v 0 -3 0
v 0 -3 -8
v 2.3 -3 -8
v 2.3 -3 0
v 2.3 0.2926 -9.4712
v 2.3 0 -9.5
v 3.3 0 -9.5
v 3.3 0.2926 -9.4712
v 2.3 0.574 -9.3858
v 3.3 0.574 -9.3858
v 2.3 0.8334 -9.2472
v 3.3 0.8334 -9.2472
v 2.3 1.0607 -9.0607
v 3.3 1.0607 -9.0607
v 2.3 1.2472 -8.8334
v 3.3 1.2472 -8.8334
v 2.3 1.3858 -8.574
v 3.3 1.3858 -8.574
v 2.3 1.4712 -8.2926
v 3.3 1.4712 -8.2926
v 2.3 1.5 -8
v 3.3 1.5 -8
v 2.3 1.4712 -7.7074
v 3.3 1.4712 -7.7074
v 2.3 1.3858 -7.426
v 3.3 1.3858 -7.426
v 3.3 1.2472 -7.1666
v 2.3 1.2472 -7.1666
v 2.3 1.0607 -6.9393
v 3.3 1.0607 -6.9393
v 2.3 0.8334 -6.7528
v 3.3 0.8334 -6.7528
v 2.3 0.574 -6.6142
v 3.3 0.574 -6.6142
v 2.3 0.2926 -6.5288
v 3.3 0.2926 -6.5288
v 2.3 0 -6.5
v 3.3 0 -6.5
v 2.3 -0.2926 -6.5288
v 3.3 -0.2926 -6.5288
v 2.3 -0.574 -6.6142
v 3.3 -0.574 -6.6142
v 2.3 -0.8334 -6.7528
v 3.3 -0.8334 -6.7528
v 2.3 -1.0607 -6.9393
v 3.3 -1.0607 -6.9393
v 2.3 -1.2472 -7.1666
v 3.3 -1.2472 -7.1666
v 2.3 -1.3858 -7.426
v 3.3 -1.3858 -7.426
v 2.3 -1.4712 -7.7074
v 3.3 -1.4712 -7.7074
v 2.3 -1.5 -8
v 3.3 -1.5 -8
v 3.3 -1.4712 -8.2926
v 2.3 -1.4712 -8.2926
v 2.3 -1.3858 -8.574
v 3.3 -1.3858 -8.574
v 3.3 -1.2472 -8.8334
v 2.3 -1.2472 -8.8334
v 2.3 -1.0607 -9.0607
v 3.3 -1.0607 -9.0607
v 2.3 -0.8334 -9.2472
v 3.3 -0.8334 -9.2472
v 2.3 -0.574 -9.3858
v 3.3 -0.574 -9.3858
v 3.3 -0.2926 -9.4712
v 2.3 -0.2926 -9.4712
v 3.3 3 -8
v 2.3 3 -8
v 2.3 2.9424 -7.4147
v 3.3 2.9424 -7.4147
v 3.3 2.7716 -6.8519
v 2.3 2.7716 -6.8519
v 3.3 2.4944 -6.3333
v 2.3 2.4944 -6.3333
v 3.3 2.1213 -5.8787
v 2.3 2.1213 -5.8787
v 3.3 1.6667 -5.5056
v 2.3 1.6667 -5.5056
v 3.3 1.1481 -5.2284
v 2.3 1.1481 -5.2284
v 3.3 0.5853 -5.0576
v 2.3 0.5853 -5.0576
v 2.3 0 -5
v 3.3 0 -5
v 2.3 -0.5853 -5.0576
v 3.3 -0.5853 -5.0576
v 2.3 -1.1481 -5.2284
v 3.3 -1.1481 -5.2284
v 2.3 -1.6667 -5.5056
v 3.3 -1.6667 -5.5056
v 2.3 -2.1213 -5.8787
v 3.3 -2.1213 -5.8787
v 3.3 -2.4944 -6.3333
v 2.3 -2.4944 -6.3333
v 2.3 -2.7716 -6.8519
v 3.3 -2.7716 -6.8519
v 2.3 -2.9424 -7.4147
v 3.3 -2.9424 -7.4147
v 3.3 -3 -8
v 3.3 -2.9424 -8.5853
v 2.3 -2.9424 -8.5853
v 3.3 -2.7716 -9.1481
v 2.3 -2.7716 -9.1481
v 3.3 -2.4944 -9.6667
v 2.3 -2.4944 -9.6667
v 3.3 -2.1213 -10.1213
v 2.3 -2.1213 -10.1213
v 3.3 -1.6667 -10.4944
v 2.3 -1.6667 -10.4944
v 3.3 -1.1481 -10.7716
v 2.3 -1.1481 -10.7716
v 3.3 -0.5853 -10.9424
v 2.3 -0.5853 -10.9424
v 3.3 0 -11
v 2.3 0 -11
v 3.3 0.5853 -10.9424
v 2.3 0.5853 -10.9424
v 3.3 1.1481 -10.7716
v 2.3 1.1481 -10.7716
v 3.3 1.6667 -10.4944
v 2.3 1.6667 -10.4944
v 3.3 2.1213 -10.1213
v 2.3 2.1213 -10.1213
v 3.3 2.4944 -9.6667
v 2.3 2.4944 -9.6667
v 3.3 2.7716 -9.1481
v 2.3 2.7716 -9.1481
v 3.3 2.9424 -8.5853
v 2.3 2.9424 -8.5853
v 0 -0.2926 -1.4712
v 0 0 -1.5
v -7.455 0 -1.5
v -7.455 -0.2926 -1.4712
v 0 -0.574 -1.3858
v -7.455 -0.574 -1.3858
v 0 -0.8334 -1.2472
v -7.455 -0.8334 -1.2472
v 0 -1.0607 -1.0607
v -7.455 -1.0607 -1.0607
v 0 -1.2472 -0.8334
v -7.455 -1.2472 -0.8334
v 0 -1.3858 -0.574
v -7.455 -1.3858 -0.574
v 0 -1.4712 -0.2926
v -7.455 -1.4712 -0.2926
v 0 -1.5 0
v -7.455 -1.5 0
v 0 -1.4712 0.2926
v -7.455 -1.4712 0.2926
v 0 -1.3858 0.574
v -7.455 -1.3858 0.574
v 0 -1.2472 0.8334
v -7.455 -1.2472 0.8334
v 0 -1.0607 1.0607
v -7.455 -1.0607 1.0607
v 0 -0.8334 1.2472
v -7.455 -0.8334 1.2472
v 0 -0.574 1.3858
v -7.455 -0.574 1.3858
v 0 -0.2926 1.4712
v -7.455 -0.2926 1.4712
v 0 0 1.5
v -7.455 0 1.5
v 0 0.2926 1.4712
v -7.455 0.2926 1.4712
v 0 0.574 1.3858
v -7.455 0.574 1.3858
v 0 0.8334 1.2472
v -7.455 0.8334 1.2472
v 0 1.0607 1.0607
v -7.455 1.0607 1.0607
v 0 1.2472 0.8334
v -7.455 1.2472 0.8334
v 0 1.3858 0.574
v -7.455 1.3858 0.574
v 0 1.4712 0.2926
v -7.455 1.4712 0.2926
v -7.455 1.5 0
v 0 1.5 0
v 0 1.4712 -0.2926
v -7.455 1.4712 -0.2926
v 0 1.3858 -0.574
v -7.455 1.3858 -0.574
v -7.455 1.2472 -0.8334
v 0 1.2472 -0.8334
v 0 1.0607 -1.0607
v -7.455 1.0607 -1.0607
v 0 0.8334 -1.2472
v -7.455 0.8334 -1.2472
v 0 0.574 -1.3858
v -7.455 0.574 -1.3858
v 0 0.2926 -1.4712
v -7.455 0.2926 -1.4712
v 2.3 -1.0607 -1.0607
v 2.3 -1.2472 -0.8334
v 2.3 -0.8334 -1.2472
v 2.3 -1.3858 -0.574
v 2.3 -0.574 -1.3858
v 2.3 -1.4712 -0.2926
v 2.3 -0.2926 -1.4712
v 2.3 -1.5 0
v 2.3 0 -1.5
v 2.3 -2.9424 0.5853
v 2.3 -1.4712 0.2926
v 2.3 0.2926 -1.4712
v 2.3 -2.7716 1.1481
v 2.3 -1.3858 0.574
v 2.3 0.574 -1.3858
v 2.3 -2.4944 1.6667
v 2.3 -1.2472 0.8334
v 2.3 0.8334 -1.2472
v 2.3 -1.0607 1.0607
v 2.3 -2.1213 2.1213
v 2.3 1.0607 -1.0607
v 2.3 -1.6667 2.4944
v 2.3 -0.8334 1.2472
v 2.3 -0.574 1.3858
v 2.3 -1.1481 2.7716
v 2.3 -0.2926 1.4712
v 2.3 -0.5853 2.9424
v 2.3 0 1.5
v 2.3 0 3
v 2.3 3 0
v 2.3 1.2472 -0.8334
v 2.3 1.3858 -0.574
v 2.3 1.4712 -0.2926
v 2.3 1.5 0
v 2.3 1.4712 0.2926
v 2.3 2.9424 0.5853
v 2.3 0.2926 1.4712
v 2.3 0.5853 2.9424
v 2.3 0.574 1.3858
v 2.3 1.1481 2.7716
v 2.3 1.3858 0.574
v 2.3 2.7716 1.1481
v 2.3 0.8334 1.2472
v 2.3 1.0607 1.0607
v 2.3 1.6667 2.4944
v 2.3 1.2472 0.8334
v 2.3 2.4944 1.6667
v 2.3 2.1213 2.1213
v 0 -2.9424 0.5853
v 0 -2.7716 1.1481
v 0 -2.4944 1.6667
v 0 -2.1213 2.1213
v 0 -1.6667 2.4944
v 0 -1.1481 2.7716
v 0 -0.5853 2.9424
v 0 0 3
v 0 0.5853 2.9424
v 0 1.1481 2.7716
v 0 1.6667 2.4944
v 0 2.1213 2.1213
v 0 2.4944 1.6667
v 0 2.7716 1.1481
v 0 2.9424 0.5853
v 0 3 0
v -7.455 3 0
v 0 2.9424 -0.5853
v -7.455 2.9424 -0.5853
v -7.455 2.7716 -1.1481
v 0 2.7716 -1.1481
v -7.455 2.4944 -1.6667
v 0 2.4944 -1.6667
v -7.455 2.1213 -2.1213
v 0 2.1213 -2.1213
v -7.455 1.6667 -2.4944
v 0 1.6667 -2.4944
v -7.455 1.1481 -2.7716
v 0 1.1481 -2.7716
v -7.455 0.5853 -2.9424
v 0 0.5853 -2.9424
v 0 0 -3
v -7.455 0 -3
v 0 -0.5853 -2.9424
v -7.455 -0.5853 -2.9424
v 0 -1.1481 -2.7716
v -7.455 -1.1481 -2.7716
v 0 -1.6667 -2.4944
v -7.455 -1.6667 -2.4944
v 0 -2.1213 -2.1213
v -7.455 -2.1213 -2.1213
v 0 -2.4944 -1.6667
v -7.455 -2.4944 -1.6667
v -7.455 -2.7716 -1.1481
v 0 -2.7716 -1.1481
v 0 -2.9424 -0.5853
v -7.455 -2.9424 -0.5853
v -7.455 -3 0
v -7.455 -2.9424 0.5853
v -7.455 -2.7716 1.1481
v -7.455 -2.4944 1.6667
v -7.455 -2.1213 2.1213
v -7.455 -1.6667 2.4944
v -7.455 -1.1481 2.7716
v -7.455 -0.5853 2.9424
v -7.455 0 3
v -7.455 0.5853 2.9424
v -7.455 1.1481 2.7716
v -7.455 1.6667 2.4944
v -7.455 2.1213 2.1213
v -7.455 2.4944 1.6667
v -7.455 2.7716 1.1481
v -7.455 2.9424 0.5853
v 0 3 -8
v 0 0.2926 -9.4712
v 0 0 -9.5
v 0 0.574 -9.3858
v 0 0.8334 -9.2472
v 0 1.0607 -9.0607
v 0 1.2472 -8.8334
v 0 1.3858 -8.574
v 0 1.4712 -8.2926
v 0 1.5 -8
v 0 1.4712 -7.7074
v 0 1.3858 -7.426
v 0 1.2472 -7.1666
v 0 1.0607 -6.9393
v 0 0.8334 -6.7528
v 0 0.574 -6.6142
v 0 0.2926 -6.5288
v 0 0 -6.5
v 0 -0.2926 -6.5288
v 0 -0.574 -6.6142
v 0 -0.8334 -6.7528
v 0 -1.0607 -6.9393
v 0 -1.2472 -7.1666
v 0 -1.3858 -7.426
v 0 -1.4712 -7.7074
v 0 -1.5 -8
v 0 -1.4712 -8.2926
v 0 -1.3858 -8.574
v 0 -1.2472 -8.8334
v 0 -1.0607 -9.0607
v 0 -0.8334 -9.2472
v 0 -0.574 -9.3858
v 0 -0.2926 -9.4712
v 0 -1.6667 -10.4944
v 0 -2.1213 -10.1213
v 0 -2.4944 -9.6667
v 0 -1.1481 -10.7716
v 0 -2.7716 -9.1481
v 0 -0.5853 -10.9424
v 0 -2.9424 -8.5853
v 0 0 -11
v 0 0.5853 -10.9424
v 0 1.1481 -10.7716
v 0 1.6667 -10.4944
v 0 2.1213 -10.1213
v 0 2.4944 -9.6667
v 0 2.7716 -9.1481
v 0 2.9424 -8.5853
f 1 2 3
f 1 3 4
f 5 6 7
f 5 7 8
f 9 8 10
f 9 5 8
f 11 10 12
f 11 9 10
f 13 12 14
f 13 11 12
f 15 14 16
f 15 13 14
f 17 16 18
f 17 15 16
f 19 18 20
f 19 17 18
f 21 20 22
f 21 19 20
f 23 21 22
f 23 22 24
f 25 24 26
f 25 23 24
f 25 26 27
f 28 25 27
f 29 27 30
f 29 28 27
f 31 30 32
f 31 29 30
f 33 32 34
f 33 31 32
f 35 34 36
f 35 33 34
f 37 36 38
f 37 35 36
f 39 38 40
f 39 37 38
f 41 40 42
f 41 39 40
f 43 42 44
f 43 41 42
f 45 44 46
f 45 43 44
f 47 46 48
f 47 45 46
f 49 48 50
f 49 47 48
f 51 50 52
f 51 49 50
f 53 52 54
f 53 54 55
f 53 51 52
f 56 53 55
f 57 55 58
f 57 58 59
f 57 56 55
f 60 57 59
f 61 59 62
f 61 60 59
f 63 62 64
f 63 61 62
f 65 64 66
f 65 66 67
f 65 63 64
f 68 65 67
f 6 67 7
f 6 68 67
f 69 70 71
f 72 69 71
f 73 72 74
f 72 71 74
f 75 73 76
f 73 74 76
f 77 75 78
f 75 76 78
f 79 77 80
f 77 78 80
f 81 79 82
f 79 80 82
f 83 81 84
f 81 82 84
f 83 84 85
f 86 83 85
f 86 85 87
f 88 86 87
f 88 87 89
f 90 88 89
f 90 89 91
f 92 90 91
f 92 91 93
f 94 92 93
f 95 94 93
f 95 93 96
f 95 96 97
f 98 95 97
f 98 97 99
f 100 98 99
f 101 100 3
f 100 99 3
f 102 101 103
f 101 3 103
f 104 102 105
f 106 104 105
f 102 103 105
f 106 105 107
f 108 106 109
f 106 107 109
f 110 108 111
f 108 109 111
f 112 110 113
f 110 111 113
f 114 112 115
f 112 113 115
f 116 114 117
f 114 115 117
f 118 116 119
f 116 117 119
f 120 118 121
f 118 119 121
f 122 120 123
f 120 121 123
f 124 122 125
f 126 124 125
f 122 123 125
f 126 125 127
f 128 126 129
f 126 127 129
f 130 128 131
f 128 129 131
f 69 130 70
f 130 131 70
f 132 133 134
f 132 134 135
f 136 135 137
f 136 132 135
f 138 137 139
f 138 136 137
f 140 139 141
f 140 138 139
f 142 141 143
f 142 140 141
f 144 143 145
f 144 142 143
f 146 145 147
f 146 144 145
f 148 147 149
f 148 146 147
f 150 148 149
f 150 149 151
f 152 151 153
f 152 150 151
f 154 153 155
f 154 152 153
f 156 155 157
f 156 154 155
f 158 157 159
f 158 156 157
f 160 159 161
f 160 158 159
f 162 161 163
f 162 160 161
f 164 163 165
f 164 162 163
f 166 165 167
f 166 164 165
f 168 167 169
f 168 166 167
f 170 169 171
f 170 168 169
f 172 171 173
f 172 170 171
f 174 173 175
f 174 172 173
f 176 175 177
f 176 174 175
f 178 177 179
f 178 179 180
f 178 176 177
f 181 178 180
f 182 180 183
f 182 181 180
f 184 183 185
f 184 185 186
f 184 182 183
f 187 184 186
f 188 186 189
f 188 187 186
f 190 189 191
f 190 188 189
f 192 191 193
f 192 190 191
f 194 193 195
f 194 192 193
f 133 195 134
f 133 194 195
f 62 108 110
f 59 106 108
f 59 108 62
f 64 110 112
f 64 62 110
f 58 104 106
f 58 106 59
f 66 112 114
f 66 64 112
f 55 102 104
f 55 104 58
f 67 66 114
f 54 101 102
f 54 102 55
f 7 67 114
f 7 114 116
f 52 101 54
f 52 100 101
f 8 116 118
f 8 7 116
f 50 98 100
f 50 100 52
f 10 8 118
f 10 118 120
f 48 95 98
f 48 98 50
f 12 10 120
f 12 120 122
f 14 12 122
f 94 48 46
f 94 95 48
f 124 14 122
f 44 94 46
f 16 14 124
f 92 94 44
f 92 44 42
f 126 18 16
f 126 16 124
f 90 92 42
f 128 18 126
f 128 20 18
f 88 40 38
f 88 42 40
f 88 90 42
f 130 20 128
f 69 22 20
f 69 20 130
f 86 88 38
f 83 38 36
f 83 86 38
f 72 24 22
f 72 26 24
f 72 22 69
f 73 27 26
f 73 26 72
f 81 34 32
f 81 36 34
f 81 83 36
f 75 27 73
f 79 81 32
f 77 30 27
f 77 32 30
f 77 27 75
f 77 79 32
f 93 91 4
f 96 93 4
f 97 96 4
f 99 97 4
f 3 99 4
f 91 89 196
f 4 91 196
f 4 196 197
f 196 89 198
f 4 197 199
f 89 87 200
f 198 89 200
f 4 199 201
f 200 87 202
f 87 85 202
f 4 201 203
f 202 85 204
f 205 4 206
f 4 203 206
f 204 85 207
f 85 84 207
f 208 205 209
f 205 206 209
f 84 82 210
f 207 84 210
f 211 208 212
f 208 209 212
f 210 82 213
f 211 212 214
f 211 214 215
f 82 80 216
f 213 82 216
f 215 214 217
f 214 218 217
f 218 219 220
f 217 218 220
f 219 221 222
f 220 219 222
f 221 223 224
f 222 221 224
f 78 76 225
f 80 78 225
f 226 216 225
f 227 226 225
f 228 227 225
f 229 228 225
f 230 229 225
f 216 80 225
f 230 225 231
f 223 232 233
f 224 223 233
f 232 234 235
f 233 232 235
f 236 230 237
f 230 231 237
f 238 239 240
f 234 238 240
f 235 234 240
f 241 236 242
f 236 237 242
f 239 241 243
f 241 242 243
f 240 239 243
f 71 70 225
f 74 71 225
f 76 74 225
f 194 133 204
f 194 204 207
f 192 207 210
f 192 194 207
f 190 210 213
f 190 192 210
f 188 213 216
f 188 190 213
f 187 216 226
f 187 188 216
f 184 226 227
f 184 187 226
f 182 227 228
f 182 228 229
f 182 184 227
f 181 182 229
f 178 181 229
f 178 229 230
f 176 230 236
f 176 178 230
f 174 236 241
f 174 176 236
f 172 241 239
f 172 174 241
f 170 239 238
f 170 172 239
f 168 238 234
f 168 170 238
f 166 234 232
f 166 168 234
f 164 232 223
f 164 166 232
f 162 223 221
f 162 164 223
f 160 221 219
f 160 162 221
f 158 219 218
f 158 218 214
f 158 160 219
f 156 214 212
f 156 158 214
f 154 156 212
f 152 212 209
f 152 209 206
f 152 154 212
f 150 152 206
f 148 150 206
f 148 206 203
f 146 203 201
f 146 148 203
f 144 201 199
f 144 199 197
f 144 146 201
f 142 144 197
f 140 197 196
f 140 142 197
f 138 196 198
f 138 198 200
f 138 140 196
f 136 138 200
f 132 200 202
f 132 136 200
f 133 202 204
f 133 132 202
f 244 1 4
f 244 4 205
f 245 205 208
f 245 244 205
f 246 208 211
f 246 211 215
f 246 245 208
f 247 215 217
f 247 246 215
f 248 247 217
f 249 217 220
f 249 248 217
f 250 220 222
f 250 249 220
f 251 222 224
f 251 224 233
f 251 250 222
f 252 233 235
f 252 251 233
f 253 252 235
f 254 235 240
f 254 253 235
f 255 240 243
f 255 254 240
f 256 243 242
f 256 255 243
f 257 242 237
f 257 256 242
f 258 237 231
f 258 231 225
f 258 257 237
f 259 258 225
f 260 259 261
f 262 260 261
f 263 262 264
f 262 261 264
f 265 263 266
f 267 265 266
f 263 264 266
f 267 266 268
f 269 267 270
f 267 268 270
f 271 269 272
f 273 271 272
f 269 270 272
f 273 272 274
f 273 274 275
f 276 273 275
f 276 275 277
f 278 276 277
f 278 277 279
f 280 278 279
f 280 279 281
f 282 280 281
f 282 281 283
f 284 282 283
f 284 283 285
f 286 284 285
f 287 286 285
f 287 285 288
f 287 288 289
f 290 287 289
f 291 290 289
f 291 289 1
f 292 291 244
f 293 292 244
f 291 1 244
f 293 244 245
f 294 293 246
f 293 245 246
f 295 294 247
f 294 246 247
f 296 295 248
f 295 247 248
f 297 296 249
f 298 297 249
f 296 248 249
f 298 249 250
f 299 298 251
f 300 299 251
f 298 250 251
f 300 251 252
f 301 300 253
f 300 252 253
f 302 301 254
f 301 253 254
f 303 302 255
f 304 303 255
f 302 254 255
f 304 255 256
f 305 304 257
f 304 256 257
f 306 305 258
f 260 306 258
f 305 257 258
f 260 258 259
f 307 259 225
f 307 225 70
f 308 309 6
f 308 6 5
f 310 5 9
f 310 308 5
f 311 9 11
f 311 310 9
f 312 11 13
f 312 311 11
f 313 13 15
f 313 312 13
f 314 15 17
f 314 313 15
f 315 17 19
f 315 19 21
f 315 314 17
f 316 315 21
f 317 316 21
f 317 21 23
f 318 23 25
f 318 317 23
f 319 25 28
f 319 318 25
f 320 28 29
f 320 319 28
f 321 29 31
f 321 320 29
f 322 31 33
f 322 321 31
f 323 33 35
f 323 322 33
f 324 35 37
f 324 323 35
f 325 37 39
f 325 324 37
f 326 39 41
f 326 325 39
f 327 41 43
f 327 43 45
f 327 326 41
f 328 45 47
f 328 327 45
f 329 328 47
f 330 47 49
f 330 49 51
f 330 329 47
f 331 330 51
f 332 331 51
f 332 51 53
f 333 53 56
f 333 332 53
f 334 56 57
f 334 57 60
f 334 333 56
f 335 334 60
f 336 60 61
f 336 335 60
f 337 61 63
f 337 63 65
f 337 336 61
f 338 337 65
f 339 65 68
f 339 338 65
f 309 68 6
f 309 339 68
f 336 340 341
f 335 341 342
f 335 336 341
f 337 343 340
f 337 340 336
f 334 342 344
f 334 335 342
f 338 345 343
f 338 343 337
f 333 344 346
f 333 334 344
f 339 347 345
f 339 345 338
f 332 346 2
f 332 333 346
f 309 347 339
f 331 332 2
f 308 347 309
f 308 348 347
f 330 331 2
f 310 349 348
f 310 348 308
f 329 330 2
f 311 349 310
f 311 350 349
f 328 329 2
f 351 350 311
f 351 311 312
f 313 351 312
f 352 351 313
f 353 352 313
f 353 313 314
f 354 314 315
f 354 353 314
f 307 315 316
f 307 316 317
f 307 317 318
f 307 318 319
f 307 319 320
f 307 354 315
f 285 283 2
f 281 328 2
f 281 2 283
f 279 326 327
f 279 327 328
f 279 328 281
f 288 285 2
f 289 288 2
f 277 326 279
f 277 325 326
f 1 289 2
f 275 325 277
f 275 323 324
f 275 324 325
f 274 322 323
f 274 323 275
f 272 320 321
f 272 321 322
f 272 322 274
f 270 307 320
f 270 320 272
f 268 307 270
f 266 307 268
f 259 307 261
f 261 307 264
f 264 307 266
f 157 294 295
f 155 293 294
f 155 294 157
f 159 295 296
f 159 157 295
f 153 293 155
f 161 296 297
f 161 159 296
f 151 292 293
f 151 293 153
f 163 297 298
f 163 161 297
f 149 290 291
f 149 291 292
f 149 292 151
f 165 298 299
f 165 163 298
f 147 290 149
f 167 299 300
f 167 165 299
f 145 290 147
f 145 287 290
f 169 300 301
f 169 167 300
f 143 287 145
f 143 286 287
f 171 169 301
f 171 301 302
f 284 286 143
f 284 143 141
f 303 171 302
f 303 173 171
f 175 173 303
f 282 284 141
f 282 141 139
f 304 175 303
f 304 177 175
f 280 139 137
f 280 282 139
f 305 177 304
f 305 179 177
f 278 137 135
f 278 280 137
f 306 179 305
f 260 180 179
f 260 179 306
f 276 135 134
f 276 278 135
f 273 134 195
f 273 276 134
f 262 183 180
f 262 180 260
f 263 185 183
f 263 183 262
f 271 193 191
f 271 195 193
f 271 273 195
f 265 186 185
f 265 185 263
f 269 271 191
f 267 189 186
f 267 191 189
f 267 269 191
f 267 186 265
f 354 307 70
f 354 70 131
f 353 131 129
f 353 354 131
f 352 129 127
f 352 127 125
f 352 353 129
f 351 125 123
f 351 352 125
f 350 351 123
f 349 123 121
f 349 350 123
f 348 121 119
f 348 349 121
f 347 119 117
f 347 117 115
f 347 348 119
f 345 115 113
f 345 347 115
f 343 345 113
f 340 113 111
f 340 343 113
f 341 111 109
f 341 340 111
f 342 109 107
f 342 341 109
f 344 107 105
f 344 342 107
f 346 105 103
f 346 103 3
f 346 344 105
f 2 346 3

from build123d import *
from build123d.topology import SkipClean

# Parameters (mm, degrees)
SKETCH1_R           = 1.5
BOSS_EXTRUDE1_DEPTH = 2.3
SKETCH2_R           = 3
SKETCH2_R_2         = 1.5
BOSS_EXTRUDE2_DEPTH = 7.455
SKETCH3_R           = 3
SKETCH3_R_2         = 1.5
BOSS_EXTRUDE3_DEPTH = 1


with BuildPart() as part:
    # Sketch1 → Boss-Extrude1 (new body)
    with BuildSketch(Plane(origin=(0, 0, 0), x_dir=(0, 0, -1), z_dir=(1, 0, 0))):
        with BuildLine():
            Line((0, 3), (8, 3))
            ThreePointArc((8, 3), (11, 0), (8, -3))
            Line((8, -3), (0, -3))
            ThreePointArc((0, -3), (-3, 0), (0, 3))
        make_face()
        Circle(SKETCH1_R, mode=Mode.SUBTRACT)
        with Locations((8, 0)):
            Circle(SKETCH1_R, mode=Mode.SUBTRACT)
    extrude(amount=BOSS_EXTRUDE1_DEPTH)

    # Sketch2 → Boss-Extrude2 (add)
    with SkipClean():  # the faces are left unmerged after this step: merging them gives an invalid solid
        with BuildSketch(Plane.ZY):
            with Locations(Location((0, 0, 0), (0, 0, 90))):
                Circle(SKETCH2_R)
            with Locations(Location((0, 0, 0), (0, 0, 180))):
                Circle(SKETCH2_R_2, mode=Mode.SUBTRACT)
        extrude(amount=BOSS_EXTRUDE2_DEPTH)

    # Sketch3 → Boss-Extrude3 (add)
    with SkipClean():  # the faces are left unmerged after this step: merging them gives an invalid solid
        with BuildSketch(Plane(origin=(2.3, 0, 0), x_dir=(0, 0, -1), z_dir=(1, 0, 0))):
            with Locations(Location((8, 0, 0), (0, 0, 90))):
                Circle(SKETCH3_R)
            with Locations((8, 0)):
                Circle(SKETCH3_R_2, mode=Mode.SUBTRACT)
        extrude(amount=BOSS_EXTRUDE3_DEPTH)


solid = part.part
